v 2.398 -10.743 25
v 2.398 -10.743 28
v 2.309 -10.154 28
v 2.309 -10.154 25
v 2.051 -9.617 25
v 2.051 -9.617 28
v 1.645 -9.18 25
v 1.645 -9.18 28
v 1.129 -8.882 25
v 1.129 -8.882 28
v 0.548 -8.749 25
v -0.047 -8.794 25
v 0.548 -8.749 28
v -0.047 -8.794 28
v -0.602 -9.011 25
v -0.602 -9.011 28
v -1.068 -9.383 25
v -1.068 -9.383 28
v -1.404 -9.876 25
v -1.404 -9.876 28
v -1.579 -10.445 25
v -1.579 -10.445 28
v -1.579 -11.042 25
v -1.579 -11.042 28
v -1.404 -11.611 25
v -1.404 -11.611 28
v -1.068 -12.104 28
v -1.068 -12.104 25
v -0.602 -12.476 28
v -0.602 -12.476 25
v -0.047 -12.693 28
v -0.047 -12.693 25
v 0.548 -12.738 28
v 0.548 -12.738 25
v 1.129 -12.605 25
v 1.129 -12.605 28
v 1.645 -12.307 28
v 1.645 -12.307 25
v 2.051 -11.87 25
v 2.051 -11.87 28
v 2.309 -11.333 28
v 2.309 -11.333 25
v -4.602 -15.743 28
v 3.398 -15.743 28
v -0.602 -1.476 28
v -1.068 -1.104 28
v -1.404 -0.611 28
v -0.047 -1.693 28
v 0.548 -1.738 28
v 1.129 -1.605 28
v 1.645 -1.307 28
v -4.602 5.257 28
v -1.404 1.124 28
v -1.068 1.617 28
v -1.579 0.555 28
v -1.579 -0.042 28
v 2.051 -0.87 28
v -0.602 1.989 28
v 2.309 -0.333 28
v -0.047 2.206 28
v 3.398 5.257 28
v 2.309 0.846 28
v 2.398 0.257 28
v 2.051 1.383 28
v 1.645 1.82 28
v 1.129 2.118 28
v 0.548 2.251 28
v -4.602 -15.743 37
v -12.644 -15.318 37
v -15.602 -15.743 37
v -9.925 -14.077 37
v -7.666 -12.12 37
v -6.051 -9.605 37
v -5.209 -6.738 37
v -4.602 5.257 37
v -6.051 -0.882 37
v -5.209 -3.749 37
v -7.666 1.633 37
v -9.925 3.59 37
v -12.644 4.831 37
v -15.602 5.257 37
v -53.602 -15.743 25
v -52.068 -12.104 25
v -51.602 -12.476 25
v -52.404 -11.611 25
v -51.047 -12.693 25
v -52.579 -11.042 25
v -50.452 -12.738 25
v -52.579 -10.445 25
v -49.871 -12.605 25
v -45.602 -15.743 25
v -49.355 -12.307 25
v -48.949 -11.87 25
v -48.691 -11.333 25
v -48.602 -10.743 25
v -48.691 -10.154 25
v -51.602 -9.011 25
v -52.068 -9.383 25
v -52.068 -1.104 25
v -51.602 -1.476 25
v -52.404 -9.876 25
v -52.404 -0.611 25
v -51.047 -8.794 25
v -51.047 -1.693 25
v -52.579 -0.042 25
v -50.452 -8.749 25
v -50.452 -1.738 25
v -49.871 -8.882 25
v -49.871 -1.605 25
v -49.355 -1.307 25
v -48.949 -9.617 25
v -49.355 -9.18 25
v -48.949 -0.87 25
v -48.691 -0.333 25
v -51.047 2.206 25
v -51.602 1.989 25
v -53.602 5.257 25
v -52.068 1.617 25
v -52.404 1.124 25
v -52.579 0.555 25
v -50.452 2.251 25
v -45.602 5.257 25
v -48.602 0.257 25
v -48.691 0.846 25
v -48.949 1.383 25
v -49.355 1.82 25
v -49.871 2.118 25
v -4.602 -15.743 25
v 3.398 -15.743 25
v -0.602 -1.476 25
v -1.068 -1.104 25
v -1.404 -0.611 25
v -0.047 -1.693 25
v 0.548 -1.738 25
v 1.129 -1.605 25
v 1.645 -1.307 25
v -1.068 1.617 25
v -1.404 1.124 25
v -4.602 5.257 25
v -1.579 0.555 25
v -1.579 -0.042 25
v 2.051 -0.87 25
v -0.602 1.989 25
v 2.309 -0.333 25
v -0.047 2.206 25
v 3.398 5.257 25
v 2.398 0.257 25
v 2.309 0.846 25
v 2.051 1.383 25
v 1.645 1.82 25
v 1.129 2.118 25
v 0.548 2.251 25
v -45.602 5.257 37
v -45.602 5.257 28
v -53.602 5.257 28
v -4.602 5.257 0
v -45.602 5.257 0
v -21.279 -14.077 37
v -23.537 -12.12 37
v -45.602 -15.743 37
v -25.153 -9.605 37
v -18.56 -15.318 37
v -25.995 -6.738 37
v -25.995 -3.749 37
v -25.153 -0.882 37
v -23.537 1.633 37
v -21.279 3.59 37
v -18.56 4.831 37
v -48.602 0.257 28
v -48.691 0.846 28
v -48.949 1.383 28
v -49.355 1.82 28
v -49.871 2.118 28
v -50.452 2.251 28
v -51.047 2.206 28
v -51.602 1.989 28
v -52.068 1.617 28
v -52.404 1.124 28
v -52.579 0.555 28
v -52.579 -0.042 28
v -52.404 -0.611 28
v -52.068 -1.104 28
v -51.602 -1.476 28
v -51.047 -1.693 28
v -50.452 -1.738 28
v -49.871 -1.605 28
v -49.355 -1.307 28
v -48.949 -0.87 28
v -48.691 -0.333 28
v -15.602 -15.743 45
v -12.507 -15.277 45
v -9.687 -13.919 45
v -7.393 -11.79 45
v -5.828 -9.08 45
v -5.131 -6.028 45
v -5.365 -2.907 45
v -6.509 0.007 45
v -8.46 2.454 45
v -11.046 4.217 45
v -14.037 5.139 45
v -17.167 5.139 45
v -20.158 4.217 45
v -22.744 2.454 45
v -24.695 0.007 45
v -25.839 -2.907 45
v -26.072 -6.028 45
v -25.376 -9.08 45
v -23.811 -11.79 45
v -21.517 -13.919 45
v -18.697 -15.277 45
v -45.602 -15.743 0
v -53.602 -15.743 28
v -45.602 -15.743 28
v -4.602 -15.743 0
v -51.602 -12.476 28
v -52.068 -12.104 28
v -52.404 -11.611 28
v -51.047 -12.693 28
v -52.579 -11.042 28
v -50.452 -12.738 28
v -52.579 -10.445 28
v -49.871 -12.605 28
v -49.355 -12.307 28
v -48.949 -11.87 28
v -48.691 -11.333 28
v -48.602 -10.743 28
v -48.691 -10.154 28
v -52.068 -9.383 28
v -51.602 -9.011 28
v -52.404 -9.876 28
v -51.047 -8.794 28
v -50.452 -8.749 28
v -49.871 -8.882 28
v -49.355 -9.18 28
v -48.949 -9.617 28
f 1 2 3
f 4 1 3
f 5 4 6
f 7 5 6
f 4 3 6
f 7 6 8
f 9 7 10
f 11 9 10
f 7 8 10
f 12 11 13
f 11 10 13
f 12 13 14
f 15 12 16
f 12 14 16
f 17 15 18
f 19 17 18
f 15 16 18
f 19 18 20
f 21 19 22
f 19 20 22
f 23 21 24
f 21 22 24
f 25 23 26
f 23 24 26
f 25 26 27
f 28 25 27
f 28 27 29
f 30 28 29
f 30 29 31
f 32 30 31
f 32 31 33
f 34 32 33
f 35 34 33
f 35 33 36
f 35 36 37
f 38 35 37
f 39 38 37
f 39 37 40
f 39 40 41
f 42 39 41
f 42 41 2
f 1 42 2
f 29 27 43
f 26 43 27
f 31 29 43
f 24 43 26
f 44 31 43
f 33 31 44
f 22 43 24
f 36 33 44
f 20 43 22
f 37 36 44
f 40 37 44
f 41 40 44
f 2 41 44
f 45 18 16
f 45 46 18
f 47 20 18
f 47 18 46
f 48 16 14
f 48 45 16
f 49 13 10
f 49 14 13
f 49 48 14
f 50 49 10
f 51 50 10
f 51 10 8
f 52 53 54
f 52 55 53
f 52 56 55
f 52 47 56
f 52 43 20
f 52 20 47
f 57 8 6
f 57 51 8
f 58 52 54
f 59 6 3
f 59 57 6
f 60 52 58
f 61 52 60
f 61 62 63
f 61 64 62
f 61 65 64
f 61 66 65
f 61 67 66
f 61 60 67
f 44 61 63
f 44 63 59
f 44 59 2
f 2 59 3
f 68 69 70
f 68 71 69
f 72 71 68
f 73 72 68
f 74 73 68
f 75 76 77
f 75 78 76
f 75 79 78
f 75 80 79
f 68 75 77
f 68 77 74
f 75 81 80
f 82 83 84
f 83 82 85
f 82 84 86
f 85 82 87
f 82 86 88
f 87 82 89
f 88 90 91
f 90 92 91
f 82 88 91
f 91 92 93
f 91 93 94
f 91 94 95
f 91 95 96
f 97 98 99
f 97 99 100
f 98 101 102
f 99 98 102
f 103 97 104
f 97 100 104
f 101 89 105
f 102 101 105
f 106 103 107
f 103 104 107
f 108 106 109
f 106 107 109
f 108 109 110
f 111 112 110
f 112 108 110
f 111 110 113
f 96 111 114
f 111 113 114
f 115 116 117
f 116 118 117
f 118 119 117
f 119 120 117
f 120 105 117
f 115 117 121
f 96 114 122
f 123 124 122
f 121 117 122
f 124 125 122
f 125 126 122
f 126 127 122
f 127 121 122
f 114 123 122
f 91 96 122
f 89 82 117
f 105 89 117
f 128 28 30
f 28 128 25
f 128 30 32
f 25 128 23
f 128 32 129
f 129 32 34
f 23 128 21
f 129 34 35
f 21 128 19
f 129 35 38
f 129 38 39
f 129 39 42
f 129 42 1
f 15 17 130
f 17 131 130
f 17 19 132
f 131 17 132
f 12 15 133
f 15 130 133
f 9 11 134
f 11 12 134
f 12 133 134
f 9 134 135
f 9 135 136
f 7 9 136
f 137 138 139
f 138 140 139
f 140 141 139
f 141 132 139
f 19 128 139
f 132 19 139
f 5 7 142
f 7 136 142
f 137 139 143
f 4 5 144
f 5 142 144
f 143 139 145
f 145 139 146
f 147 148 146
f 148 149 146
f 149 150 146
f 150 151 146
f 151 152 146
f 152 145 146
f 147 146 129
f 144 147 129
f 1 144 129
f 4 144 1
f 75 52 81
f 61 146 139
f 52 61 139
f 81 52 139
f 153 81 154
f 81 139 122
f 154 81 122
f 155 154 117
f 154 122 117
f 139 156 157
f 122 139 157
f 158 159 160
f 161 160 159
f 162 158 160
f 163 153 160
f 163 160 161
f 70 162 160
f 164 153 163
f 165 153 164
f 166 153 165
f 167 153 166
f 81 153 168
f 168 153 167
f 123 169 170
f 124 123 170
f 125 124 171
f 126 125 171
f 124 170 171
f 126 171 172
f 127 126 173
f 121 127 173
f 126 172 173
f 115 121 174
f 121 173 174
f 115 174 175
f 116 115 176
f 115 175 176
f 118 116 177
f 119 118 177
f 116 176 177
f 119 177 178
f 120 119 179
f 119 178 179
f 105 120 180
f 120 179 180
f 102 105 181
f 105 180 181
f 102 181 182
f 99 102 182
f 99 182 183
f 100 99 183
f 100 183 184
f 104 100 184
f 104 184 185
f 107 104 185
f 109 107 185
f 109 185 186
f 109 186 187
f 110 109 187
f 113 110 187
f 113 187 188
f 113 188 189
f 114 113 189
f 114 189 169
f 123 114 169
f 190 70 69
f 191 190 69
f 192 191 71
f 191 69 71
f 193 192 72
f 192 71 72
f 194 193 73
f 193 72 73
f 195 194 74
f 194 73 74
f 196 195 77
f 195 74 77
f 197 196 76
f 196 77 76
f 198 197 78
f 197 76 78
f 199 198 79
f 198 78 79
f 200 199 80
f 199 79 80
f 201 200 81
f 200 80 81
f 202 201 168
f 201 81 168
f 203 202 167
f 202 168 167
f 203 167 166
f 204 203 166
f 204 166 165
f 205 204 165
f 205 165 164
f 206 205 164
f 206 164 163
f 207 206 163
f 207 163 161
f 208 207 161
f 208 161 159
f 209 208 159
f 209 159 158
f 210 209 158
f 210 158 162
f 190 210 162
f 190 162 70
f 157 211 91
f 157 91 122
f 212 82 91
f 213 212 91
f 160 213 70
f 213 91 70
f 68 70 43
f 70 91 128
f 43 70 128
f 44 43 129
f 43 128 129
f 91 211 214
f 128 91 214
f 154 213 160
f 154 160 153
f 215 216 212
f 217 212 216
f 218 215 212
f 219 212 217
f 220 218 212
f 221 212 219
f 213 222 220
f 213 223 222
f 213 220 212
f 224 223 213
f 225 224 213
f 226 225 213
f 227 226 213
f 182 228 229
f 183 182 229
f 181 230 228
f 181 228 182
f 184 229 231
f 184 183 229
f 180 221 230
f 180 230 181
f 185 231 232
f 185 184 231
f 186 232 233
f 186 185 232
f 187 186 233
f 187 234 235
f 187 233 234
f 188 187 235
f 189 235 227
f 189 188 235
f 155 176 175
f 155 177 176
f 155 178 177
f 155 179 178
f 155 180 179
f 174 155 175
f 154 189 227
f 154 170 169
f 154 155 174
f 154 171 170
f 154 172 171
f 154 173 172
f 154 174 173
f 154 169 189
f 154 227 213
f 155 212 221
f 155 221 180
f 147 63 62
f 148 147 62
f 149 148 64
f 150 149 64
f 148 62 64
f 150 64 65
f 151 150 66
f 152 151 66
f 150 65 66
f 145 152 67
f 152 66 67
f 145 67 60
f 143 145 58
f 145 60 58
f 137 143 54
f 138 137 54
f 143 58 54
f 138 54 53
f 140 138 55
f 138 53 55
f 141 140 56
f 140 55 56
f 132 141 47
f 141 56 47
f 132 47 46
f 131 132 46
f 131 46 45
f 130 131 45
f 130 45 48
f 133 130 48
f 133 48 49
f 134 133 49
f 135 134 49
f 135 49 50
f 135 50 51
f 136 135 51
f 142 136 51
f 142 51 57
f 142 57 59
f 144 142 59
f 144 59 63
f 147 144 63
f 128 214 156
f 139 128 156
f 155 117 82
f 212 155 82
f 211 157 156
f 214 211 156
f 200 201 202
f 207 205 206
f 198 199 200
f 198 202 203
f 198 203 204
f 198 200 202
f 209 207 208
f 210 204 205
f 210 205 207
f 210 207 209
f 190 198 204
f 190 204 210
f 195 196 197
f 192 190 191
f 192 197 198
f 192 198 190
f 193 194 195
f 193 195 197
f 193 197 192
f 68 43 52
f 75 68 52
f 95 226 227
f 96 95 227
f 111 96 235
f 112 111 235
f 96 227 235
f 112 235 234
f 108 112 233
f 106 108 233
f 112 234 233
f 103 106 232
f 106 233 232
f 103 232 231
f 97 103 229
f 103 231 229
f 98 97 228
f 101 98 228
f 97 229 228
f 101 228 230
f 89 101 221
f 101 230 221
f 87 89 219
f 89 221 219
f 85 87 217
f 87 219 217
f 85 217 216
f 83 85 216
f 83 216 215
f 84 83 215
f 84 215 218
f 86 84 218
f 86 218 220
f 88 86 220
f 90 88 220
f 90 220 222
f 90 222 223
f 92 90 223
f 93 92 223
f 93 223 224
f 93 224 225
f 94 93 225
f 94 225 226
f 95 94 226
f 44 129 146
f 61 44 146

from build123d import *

# Parameters (mm, degrees)
SKETCH1_W           = 41
SKETCH1_H           = 21
BOSS_EXTRUDE1_DEPTH = 25
BOSS_EXTRUDE2_DEPTH = 3
SKETCH5_W           = 41
SKETCH5_H           = 21
BOSS_EXTRUDE3_DEPTH = 9
SKETCH6_R           = 2
CUT_EXTRUDE1_DEPTH  = 9
SKETCH7_R           = 2
CUT_EXTRUDE2_DEPTH  = 9
SKETCH8_R           = 10.5
BOSS_EXTRUDE4_DEPTH = 8


with BuildPart() as part:
    # Sketch1 → Boss-Extrude1 (new body)
    with BuildSketch(Plane.XY):
        with Locations((-25.101821211, -5.243485894)):
            Rectangle(SKETCH1_W, SKETCH1_H)
    extrude(amount=BOSS_EXTRUDE1_DEPTH)

    # Sketch4 → Boss-Extrude2 (add)
    with BuildSketch(Plane.XY.offset(25)):
        Polygon((-4.601821211, 5.256514106), (-45.601821211, 5.256514106), (-53.601821211, 5.256514106), (-53.601821211, -15.743485894), (-45.601821211, -15.743485894), (-4.601821211, -15.743485894), (3.398178789, -15.743485894), (3.398178789, 5.256514106), align=None)
    extrude(amount=BOSS_EXTRUDE2_DEPTH)

    # Sketch5 → Boss-Extrude3 (add)
    with BuildSketch(Plane.XY.offset(28)):
        with Locations((-25.101821211, -5.243485894)):
            Rectangle(SKETCH5_W, SKETCH5_H)
    extrude(amount=BOSS_EXTRUDE3_DEPTH)

    # Sketch6 → Cut-Extrude1 (cut)
    with BuildSketch(Plane.XY.offset(28)):
        with Locations((-50.601821211, -10.743485894)):
            Circle(SKETCH6_R)
        with Locations((-50.601821211, 0.256514106)):
            Circle(SKETCH6_R)
    extrude(amount=-CUT_EXTRUDE1_DEPTH, mode=Mode.SUBTRACT)

    # Sketch7 → Cut-Extrude2 (cut)
    with BuildSketch(Plane.XY.offset(28)):
        with Locations((0.398178789, -10.743485894)):
            Circle(SKETCH7_R)
        with Locations((0.398178789, 0.256514106)):
            Circle(SKETCH7_R)
    extrude(amount=-CUT_EXTRUDE2_DEPTH, mode=Mode.SUBTRACT)

    # Sketch8 → Boss-Extrude4 (add)
    with BuildSketch(Plane.XY.offset(37)):
        with Locations(Location((-15.601821211, -5.243485894, 0), (0, 0, 270))):
            Circle(SKETCH8_R)
    extrude(amount=BOSS_EXTRUDE4_DEPTH)


solid = part.part
